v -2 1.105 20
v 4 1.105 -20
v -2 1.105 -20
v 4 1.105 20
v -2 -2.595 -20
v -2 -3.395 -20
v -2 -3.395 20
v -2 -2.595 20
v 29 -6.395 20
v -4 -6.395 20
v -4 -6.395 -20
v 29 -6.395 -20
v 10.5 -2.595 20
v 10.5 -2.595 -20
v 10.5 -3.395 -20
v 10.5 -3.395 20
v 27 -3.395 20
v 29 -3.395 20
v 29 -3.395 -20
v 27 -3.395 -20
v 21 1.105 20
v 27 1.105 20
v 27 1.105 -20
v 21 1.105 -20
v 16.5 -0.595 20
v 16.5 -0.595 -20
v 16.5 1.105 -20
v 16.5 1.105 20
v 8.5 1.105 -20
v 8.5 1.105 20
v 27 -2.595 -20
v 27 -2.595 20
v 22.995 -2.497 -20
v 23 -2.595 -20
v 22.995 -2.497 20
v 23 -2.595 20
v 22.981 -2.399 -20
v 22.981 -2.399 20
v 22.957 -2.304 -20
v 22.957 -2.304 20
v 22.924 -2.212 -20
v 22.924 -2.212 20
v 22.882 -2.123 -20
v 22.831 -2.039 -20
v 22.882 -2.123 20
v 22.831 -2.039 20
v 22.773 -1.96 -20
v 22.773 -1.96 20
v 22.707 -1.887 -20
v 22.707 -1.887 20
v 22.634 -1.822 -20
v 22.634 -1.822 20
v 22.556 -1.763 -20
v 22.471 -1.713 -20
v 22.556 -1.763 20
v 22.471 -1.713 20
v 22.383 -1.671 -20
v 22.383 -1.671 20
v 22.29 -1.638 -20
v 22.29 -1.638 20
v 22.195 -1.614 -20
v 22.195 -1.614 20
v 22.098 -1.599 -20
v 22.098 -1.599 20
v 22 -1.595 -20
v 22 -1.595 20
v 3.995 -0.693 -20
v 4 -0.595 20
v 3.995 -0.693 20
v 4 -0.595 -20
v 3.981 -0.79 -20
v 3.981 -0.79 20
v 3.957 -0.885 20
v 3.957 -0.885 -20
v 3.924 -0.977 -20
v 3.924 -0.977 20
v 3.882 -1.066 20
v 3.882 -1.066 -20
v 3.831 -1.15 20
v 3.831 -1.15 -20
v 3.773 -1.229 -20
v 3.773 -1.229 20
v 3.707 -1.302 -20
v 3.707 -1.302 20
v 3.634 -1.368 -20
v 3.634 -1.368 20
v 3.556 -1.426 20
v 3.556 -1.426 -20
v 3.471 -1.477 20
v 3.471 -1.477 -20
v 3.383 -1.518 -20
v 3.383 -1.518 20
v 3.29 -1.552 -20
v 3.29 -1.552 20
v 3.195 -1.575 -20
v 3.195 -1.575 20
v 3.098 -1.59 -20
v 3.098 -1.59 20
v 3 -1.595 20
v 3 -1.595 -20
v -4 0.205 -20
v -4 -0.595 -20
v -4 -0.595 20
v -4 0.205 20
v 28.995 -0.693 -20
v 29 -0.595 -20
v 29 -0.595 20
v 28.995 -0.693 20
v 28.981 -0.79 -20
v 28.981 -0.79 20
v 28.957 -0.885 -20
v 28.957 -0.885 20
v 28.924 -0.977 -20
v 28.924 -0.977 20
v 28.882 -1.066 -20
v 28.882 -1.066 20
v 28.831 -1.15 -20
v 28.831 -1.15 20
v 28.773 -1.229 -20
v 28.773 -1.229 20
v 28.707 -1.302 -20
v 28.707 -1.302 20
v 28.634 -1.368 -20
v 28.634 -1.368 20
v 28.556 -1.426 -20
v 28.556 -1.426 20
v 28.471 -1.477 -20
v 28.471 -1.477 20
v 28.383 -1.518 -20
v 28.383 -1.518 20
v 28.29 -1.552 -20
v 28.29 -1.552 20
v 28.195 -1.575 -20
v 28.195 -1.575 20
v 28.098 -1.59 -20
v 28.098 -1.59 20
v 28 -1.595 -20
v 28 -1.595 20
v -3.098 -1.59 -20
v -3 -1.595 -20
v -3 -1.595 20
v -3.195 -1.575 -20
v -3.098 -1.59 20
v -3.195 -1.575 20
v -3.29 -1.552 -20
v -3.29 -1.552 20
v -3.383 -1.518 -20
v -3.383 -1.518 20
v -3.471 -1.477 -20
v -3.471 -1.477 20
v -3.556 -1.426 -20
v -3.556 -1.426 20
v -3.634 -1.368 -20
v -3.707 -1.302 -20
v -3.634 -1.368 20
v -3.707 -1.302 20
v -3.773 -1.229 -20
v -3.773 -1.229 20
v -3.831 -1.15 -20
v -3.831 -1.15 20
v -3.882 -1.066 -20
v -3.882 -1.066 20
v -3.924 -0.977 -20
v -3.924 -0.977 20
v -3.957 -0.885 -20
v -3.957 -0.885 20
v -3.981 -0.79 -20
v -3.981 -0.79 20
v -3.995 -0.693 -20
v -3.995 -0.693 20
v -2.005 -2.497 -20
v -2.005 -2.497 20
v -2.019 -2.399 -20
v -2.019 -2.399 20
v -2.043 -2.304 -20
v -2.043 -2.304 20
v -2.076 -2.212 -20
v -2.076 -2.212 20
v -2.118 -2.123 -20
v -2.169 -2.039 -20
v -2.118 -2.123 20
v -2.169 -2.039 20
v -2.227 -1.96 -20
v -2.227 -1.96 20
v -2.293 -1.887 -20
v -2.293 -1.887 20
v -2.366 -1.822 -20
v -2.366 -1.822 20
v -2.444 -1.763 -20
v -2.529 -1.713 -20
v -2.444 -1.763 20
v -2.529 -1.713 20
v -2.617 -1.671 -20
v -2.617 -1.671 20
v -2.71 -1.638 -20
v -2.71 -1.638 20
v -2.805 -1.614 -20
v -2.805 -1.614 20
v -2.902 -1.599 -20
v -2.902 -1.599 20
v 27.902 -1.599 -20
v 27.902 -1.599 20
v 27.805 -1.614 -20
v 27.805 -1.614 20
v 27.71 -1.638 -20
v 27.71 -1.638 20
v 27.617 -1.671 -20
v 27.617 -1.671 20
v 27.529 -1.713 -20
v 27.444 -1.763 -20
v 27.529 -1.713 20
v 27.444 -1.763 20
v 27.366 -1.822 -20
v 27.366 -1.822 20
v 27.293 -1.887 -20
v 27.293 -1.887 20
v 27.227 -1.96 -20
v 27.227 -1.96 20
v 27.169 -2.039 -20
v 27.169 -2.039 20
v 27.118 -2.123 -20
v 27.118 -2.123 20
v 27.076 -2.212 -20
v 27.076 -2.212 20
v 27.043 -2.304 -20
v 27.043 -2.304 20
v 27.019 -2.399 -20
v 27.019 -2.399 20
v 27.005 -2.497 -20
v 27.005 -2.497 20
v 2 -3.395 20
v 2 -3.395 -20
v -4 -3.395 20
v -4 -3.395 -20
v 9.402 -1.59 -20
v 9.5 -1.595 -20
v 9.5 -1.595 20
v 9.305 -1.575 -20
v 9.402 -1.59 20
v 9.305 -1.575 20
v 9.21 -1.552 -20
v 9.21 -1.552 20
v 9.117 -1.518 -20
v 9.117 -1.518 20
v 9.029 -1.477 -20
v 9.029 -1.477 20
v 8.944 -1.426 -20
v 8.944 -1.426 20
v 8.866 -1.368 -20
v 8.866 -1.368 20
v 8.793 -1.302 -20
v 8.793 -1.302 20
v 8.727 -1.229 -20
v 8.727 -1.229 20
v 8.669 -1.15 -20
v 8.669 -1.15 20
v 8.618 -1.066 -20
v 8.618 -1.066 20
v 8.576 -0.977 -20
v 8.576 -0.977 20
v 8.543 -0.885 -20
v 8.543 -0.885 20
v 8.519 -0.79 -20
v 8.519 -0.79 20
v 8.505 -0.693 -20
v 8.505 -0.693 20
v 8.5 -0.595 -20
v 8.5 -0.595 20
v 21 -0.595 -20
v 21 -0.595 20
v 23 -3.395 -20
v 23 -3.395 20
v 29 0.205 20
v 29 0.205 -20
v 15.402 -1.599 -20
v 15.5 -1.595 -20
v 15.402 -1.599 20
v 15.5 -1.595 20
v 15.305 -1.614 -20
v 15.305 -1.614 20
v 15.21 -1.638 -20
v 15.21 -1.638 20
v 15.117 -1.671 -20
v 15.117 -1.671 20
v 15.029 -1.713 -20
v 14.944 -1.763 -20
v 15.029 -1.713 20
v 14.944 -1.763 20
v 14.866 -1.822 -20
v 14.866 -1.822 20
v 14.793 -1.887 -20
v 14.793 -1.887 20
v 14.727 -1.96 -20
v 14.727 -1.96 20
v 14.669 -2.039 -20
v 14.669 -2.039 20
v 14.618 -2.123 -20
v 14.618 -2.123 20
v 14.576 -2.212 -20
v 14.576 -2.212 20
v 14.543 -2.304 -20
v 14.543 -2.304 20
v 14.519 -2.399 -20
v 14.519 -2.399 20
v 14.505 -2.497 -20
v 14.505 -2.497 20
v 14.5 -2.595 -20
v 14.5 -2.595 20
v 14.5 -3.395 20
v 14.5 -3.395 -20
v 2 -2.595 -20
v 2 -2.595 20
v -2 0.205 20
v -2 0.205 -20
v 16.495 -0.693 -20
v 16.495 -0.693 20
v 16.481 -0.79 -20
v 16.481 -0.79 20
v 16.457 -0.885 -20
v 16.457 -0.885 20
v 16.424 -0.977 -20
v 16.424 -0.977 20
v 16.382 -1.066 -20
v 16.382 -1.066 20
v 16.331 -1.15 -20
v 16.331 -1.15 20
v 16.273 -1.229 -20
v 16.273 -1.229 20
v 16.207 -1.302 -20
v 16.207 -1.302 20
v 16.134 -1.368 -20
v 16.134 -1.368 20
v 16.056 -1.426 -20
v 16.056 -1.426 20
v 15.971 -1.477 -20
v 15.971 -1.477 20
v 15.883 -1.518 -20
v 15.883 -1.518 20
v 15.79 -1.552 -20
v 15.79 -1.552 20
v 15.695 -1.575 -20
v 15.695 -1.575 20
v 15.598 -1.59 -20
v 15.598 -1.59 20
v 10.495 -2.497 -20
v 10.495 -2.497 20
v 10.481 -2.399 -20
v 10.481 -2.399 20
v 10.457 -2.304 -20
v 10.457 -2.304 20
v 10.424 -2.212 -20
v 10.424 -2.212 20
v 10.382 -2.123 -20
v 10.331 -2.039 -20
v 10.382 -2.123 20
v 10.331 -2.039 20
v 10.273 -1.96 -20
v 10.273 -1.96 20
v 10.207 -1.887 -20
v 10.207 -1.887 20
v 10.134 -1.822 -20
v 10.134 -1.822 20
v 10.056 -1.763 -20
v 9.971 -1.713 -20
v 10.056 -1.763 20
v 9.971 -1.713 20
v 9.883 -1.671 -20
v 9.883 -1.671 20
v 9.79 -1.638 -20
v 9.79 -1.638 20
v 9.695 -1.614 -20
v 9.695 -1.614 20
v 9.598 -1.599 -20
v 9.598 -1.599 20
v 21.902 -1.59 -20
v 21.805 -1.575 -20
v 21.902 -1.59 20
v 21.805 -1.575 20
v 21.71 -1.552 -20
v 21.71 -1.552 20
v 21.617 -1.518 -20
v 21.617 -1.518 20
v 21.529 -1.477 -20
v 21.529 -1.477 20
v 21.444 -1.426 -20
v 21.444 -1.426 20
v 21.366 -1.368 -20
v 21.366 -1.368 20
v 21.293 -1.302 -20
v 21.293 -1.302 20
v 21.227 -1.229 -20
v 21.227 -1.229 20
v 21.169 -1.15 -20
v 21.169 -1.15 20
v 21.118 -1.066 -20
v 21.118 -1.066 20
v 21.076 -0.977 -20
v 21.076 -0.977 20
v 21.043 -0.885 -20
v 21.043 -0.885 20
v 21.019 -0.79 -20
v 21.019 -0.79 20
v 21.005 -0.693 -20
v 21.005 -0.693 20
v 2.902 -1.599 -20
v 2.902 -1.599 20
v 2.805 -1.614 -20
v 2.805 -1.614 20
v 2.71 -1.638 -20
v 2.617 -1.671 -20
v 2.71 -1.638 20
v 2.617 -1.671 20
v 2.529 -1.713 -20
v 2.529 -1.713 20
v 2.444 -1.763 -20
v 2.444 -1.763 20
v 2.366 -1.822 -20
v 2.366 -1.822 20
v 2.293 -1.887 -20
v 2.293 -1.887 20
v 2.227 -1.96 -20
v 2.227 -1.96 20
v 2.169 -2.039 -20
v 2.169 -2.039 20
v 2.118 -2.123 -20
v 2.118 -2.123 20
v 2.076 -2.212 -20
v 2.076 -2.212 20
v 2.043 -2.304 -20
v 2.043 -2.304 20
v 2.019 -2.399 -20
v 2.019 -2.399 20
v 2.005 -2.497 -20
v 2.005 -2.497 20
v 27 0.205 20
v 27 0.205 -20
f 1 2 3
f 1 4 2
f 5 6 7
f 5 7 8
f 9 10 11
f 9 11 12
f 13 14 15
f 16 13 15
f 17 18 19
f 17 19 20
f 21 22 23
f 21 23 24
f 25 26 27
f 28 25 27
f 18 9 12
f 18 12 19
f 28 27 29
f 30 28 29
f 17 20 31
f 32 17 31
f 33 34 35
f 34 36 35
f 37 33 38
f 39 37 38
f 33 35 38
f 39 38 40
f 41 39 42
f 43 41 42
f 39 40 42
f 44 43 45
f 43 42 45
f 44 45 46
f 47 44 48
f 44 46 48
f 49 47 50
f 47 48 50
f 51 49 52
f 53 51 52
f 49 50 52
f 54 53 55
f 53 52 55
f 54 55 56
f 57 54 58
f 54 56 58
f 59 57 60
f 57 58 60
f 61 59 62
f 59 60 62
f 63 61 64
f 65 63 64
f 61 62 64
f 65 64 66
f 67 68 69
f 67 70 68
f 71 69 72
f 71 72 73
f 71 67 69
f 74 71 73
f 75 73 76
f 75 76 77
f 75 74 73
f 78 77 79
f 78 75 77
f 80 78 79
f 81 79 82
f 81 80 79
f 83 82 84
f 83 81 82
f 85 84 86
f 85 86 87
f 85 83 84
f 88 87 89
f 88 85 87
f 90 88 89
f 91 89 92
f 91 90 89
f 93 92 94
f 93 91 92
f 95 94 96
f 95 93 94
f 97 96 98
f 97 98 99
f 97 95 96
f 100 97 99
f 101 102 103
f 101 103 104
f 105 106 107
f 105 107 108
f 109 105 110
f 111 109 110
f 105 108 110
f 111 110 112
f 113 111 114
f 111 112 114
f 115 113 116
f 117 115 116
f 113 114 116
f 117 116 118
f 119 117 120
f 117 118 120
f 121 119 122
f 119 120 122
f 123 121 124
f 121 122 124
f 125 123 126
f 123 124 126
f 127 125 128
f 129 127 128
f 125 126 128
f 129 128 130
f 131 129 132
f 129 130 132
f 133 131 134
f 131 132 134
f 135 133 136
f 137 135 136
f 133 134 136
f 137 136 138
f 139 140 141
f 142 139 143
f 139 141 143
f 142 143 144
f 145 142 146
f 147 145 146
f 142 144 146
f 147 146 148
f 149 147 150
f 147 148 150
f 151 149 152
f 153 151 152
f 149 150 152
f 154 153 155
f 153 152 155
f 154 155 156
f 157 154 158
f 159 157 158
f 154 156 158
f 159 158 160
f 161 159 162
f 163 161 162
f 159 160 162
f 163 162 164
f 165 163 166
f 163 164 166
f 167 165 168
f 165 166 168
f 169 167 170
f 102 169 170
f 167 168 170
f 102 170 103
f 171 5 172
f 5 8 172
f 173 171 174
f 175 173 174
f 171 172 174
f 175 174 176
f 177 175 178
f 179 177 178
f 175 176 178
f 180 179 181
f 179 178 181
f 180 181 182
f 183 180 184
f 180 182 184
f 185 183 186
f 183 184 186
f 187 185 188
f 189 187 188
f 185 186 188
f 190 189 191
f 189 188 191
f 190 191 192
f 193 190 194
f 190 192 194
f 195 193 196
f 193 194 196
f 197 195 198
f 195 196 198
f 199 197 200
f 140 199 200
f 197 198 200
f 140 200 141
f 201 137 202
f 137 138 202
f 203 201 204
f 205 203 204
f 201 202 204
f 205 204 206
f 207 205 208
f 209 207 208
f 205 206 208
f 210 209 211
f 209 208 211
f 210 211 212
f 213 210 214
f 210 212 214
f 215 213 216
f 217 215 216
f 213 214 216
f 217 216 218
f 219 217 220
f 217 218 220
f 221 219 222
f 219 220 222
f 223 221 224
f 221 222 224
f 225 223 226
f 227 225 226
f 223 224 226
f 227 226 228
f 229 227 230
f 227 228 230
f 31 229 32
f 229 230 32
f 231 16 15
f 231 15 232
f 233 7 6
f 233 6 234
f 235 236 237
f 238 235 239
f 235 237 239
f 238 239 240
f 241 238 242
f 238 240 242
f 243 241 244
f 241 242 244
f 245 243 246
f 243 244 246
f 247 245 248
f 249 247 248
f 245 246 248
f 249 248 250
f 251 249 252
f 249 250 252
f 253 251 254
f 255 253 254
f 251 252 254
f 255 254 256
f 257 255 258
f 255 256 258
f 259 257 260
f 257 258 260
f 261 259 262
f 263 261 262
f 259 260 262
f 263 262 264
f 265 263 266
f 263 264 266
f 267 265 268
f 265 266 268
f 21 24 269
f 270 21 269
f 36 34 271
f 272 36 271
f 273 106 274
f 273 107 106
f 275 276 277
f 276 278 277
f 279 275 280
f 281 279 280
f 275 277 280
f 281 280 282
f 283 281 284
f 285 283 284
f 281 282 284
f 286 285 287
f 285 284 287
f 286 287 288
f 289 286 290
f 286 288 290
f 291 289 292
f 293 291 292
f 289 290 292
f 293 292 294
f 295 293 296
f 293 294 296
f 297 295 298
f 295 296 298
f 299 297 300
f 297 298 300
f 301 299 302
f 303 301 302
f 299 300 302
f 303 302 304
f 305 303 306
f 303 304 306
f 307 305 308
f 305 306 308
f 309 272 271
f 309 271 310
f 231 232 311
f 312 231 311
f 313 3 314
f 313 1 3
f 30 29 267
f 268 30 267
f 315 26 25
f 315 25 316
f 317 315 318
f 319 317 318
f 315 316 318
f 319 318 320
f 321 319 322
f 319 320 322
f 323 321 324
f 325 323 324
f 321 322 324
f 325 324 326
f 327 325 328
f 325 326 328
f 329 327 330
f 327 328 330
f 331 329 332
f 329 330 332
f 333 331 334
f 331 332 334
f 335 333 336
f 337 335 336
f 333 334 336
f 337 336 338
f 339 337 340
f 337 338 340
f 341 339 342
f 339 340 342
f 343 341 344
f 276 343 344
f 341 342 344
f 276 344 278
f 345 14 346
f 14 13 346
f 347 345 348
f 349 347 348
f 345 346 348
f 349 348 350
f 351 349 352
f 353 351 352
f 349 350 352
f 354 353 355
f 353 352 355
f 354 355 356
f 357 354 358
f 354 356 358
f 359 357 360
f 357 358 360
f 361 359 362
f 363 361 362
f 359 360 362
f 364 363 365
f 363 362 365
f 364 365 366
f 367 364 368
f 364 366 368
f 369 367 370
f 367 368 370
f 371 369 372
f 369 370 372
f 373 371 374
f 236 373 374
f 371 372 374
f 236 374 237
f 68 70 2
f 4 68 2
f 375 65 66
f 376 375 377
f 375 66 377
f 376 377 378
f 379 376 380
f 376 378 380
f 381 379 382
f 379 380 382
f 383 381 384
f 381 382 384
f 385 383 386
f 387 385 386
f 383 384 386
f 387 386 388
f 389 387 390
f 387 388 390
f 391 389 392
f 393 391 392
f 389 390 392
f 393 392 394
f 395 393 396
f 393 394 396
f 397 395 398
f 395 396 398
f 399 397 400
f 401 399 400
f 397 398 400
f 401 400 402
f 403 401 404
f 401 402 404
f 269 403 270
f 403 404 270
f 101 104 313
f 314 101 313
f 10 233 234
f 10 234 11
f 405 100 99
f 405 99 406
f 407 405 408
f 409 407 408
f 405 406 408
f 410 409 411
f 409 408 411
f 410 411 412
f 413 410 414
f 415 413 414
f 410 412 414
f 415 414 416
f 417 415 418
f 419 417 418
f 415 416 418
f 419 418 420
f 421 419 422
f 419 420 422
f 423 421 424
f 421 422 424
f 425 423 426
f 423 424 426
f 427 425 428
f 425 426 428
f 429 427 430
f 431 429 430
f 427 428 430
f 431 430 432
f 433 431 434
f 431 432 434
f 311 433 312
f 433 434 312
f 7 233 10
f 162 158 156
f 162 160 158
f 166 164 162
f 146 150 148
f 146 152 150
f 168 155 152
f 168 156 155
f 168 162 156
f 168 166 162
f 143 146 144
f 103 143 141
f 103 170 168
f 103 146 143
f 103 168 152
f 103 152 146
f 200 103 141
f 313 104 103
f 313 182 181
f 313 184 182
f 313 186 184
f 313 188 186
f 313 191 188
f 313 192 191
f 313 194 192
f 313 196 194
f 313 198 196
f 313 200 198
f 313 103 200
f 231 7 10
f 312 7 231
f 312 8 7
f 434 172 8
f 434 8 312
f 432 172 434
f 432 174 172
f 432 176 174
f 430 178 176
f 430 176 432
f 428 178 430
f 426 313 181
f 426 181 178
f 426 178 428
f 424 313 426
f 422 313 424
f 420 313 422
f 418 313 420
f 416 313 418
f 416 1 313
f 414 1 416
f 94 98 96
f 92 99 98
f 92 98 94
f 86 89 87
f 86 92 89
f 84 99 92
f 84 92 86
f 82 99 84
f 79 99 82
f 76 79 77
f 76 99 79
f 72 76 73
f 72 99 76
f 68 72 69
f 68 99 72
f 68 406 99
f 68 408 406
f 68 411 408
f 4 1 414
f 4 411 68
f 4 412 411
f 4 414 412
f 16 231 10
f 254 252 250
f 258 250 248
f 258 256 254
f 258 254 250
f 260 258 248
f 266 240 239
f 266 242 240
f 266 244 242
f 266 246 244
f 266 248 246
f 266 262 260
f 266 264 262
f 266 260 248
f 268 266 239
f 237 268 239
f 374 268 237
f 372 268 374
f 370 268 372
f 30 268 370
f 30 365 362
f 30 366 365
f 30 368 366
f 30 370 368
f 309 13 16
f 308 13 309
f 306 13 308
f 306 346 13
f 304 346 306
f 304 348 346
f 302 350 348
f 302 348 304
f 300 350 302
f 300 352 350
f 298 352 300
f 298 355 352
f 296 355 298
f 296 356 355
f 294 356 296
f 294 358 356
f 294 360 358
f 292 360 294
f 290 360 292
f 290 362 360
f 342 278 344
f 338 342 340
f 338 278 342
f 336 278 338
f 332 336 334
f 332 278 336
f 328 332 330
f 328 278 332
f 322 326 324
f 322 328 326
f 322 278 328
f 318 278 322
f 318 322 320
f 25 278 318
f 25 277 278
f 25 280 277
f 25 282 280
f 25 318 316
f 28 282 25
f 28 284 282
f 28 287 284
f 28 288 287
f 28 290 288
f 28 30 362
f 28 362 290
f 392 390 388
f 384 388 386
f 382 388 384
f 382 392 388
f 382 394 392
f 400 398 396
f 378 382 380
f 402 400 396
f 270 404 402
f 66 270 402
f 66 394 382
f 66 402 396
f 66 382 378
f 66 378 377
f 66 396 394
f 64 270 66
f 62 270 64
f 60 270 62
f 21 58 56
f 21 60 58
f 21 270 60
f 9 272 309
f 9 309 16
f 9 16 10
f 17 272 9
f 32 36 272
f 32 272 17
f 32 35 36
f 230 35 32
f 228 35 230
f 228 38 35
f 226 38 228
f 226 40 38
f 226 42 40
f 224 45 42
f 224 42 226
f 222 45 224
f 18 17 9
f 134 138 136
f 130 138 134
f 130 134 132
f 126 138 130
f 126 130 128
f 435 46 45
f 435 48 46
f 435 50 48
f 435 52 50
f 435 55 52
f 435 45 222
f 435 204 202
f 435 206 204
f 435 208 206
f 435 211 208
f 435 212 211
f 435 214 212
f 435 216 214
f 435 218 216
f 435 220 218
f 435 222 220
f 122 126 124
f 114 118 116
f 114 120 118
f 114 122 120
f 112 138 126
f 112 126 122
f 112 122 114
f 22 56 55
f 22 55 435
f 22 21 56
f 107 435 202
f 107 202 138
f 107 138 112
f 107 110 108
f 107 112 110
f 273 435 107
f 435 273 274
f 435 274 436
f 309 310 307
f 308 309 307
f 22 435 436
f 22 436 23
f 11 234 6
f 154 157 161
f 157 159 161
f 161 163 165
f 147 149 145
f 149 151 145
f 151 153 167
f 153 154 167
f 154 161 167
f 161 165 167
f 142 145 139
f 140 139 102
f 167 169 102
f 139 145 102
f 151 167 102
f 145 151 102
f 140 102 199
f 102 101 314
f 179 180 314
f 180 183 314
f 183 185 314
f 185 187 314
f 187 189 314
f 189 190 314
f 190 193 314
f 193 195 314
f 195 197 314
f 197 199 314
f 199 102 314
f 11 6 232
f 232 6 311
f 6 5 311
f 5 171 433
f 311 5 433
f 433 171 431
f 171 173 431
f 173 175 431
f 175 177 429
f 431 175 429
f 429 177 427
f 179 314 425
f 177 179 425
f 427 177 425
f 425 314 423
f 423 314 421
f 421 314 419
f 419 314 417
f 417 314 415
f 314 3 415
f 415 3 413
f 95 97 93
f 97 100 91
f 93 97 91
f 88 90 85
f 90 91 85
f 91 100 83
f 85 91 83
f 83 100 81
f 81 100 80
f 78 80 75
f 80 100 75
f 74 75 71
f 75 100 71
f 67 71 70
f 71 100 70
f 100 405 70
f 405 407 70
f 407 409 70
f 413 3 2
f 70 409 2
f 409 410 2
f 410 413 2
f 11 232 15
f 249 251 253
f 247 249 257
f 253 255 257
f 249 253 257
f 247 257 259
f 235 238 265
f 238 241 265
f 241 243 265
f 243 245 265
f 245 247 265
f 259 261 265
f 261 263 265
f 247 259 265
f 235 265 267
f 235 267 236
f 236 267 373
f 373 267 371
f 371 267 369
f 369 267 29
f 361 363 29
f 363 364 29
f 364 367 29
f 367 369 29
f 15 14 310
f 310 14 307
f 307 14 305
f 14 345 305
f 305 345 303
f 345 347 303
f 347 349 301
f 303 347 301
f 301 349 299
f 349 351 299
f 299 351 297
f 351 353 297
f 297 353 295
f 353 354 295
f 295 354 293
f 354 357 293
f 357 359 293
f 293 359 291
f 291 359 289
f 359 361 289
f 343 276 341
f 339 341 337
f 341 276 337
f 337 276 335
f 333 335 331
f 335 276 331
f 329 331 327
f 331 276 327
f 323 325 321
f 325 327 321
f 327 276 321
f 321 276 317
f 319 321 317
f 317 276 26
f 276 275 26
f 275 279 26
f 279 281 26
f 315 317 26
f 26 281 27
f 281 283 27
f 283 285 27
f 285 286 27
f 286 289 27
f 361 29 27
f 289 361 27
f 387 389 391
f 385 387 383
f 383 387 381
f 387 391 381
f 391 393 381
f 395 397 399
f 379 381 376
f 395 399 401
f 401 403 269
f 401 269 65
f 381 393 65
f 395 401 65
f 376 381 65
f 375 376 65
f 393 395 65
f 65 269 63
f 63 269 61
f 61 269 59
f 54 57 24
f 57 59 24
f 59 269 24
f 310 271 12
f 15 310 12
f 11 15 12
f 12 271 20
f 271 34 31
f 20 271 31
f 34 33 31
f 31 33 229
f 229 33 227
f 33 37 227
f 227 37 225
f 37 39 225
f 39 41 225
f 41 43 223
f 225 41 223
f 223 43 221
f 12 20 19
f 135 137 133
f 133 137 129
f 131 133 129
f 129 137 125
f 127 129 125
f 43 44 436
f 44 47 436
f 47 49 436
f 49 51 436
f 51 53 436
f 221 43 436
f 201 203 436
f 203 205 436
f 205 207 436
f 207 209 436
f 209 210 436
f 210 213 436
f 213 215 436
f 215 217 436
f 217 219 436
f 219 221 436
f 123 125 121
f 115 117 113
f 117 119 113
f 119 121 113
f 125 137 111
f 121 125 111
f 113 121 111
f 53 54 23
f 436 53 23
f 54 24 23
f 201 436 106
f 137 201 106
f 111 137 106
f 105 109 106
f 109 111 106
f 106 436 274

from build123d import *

# Parameters (mm, degrees)
F0_W     = 4
F0_H     = 1.8
F0_W_2   = 2
F1_DEPTH = 20
F2_R     = 0.99999


# Not quite as in the source:
# - a fillet or chamfer is up to 0.001 mm smaller than in the source, because OpenCascade refuses the exact size


with BuildPart() as f1:
    # F0 (on Top) → F1 (new body, symmetric)
    with BuildSketch(Plane.XY):
        Polygon((-2, 1.1054119891), (-2, 0.2054119891), (2, 0.2054119891), (4, 0.2054119891), (4, 1.1054119891), align=None)
        with Locations((0, -0.6945880109)):
            Rectangle(F0_W, F0_H)
        with Locations((-3, -0.6945880109)):
            Rectangle(F0_W_2, F0_H)
        with Locations((3, -0.6945880109)):
            Rectangle(F0_W_2, F0_H)
        with Locations((0, -2.4945880109)):
            Rectangle(F0_W, F0_H)
        Polygon((2, -3.3945880109), (-2, -3.3945880109), (-4, -3.3945880109), (-4, -6.3945880109), (29, -6.3945880109), (29, -3.3945880109), (27, -3.3945880109), (23, -3.3945880109), (14.5, -3.3945880109), (10.5, -3.3945880109), align=None)
        with Locations((12.5, -2.4945880109)):
            Rectangle(F0_W, F0_H)
        with Locations((12.5, -0.6945880109)):
            Rectangle(F0_W, F0_H)
        with Locations((9.5, -0.6945880109)):
            Rectangle(F0_W_2, F0_H)
        with Locations((15.5, -0.6945880109)):
            Rectangle(F0_W_2, F0_H)
        with Locations((25, -2.4945880109)):
            Rectangle(F0_W, F0_H)
        Polygon((8.5, 0.2054119891), (10.5, 0.2054119891), (14.5, 0.2054119891), (16.5, 0.2054119891), (16.5, 1.1054119891), (8.5, 1.1054119891), align=None)
        with Locations((25, -0.6945880109)):
            Rectangle(F0_W, F0_H)
        with Locations((22, -0.6945880109)):
            Rectangle(F0_W_2, F0_H)
        with Locations((28, -0.6945880109)):
            Rectangle(F0_W_2, F0_H)
        Polygon((21, 0.2054119891), (23, 0.2054119891), (27, 0.2054119891), (27, 1.1054119891), (21, 1.1054119891), align=None)
    extrude(amount=F1_DEPTH, both=True)

    # F2 (radius 1 in the source; OpenCascade refuses exactly that, so slightly less here)
    f2_edges = [f1.edges().sort_by_distance(p)[0] for p in [
        (-2, -1.594588, 0),
        (2, -1.594588, 0),
        (10.5, -1.594588, 0),
        (14.5, -1.594588, 0),
        (23, -1.594588, 0),
        (27, -1.594588, 0),
        (8.5, -1.594588, 0),
        (-4, -1.594588, 0),
        (21, -1.594588, 0),
        (16.5, -1.594588, 0),
        (29, -1.594588, 0),
        (4, -1.594588, 0),
    ]]
    fillet(f2_edges, radius=F2_R)


solid = f1.part
